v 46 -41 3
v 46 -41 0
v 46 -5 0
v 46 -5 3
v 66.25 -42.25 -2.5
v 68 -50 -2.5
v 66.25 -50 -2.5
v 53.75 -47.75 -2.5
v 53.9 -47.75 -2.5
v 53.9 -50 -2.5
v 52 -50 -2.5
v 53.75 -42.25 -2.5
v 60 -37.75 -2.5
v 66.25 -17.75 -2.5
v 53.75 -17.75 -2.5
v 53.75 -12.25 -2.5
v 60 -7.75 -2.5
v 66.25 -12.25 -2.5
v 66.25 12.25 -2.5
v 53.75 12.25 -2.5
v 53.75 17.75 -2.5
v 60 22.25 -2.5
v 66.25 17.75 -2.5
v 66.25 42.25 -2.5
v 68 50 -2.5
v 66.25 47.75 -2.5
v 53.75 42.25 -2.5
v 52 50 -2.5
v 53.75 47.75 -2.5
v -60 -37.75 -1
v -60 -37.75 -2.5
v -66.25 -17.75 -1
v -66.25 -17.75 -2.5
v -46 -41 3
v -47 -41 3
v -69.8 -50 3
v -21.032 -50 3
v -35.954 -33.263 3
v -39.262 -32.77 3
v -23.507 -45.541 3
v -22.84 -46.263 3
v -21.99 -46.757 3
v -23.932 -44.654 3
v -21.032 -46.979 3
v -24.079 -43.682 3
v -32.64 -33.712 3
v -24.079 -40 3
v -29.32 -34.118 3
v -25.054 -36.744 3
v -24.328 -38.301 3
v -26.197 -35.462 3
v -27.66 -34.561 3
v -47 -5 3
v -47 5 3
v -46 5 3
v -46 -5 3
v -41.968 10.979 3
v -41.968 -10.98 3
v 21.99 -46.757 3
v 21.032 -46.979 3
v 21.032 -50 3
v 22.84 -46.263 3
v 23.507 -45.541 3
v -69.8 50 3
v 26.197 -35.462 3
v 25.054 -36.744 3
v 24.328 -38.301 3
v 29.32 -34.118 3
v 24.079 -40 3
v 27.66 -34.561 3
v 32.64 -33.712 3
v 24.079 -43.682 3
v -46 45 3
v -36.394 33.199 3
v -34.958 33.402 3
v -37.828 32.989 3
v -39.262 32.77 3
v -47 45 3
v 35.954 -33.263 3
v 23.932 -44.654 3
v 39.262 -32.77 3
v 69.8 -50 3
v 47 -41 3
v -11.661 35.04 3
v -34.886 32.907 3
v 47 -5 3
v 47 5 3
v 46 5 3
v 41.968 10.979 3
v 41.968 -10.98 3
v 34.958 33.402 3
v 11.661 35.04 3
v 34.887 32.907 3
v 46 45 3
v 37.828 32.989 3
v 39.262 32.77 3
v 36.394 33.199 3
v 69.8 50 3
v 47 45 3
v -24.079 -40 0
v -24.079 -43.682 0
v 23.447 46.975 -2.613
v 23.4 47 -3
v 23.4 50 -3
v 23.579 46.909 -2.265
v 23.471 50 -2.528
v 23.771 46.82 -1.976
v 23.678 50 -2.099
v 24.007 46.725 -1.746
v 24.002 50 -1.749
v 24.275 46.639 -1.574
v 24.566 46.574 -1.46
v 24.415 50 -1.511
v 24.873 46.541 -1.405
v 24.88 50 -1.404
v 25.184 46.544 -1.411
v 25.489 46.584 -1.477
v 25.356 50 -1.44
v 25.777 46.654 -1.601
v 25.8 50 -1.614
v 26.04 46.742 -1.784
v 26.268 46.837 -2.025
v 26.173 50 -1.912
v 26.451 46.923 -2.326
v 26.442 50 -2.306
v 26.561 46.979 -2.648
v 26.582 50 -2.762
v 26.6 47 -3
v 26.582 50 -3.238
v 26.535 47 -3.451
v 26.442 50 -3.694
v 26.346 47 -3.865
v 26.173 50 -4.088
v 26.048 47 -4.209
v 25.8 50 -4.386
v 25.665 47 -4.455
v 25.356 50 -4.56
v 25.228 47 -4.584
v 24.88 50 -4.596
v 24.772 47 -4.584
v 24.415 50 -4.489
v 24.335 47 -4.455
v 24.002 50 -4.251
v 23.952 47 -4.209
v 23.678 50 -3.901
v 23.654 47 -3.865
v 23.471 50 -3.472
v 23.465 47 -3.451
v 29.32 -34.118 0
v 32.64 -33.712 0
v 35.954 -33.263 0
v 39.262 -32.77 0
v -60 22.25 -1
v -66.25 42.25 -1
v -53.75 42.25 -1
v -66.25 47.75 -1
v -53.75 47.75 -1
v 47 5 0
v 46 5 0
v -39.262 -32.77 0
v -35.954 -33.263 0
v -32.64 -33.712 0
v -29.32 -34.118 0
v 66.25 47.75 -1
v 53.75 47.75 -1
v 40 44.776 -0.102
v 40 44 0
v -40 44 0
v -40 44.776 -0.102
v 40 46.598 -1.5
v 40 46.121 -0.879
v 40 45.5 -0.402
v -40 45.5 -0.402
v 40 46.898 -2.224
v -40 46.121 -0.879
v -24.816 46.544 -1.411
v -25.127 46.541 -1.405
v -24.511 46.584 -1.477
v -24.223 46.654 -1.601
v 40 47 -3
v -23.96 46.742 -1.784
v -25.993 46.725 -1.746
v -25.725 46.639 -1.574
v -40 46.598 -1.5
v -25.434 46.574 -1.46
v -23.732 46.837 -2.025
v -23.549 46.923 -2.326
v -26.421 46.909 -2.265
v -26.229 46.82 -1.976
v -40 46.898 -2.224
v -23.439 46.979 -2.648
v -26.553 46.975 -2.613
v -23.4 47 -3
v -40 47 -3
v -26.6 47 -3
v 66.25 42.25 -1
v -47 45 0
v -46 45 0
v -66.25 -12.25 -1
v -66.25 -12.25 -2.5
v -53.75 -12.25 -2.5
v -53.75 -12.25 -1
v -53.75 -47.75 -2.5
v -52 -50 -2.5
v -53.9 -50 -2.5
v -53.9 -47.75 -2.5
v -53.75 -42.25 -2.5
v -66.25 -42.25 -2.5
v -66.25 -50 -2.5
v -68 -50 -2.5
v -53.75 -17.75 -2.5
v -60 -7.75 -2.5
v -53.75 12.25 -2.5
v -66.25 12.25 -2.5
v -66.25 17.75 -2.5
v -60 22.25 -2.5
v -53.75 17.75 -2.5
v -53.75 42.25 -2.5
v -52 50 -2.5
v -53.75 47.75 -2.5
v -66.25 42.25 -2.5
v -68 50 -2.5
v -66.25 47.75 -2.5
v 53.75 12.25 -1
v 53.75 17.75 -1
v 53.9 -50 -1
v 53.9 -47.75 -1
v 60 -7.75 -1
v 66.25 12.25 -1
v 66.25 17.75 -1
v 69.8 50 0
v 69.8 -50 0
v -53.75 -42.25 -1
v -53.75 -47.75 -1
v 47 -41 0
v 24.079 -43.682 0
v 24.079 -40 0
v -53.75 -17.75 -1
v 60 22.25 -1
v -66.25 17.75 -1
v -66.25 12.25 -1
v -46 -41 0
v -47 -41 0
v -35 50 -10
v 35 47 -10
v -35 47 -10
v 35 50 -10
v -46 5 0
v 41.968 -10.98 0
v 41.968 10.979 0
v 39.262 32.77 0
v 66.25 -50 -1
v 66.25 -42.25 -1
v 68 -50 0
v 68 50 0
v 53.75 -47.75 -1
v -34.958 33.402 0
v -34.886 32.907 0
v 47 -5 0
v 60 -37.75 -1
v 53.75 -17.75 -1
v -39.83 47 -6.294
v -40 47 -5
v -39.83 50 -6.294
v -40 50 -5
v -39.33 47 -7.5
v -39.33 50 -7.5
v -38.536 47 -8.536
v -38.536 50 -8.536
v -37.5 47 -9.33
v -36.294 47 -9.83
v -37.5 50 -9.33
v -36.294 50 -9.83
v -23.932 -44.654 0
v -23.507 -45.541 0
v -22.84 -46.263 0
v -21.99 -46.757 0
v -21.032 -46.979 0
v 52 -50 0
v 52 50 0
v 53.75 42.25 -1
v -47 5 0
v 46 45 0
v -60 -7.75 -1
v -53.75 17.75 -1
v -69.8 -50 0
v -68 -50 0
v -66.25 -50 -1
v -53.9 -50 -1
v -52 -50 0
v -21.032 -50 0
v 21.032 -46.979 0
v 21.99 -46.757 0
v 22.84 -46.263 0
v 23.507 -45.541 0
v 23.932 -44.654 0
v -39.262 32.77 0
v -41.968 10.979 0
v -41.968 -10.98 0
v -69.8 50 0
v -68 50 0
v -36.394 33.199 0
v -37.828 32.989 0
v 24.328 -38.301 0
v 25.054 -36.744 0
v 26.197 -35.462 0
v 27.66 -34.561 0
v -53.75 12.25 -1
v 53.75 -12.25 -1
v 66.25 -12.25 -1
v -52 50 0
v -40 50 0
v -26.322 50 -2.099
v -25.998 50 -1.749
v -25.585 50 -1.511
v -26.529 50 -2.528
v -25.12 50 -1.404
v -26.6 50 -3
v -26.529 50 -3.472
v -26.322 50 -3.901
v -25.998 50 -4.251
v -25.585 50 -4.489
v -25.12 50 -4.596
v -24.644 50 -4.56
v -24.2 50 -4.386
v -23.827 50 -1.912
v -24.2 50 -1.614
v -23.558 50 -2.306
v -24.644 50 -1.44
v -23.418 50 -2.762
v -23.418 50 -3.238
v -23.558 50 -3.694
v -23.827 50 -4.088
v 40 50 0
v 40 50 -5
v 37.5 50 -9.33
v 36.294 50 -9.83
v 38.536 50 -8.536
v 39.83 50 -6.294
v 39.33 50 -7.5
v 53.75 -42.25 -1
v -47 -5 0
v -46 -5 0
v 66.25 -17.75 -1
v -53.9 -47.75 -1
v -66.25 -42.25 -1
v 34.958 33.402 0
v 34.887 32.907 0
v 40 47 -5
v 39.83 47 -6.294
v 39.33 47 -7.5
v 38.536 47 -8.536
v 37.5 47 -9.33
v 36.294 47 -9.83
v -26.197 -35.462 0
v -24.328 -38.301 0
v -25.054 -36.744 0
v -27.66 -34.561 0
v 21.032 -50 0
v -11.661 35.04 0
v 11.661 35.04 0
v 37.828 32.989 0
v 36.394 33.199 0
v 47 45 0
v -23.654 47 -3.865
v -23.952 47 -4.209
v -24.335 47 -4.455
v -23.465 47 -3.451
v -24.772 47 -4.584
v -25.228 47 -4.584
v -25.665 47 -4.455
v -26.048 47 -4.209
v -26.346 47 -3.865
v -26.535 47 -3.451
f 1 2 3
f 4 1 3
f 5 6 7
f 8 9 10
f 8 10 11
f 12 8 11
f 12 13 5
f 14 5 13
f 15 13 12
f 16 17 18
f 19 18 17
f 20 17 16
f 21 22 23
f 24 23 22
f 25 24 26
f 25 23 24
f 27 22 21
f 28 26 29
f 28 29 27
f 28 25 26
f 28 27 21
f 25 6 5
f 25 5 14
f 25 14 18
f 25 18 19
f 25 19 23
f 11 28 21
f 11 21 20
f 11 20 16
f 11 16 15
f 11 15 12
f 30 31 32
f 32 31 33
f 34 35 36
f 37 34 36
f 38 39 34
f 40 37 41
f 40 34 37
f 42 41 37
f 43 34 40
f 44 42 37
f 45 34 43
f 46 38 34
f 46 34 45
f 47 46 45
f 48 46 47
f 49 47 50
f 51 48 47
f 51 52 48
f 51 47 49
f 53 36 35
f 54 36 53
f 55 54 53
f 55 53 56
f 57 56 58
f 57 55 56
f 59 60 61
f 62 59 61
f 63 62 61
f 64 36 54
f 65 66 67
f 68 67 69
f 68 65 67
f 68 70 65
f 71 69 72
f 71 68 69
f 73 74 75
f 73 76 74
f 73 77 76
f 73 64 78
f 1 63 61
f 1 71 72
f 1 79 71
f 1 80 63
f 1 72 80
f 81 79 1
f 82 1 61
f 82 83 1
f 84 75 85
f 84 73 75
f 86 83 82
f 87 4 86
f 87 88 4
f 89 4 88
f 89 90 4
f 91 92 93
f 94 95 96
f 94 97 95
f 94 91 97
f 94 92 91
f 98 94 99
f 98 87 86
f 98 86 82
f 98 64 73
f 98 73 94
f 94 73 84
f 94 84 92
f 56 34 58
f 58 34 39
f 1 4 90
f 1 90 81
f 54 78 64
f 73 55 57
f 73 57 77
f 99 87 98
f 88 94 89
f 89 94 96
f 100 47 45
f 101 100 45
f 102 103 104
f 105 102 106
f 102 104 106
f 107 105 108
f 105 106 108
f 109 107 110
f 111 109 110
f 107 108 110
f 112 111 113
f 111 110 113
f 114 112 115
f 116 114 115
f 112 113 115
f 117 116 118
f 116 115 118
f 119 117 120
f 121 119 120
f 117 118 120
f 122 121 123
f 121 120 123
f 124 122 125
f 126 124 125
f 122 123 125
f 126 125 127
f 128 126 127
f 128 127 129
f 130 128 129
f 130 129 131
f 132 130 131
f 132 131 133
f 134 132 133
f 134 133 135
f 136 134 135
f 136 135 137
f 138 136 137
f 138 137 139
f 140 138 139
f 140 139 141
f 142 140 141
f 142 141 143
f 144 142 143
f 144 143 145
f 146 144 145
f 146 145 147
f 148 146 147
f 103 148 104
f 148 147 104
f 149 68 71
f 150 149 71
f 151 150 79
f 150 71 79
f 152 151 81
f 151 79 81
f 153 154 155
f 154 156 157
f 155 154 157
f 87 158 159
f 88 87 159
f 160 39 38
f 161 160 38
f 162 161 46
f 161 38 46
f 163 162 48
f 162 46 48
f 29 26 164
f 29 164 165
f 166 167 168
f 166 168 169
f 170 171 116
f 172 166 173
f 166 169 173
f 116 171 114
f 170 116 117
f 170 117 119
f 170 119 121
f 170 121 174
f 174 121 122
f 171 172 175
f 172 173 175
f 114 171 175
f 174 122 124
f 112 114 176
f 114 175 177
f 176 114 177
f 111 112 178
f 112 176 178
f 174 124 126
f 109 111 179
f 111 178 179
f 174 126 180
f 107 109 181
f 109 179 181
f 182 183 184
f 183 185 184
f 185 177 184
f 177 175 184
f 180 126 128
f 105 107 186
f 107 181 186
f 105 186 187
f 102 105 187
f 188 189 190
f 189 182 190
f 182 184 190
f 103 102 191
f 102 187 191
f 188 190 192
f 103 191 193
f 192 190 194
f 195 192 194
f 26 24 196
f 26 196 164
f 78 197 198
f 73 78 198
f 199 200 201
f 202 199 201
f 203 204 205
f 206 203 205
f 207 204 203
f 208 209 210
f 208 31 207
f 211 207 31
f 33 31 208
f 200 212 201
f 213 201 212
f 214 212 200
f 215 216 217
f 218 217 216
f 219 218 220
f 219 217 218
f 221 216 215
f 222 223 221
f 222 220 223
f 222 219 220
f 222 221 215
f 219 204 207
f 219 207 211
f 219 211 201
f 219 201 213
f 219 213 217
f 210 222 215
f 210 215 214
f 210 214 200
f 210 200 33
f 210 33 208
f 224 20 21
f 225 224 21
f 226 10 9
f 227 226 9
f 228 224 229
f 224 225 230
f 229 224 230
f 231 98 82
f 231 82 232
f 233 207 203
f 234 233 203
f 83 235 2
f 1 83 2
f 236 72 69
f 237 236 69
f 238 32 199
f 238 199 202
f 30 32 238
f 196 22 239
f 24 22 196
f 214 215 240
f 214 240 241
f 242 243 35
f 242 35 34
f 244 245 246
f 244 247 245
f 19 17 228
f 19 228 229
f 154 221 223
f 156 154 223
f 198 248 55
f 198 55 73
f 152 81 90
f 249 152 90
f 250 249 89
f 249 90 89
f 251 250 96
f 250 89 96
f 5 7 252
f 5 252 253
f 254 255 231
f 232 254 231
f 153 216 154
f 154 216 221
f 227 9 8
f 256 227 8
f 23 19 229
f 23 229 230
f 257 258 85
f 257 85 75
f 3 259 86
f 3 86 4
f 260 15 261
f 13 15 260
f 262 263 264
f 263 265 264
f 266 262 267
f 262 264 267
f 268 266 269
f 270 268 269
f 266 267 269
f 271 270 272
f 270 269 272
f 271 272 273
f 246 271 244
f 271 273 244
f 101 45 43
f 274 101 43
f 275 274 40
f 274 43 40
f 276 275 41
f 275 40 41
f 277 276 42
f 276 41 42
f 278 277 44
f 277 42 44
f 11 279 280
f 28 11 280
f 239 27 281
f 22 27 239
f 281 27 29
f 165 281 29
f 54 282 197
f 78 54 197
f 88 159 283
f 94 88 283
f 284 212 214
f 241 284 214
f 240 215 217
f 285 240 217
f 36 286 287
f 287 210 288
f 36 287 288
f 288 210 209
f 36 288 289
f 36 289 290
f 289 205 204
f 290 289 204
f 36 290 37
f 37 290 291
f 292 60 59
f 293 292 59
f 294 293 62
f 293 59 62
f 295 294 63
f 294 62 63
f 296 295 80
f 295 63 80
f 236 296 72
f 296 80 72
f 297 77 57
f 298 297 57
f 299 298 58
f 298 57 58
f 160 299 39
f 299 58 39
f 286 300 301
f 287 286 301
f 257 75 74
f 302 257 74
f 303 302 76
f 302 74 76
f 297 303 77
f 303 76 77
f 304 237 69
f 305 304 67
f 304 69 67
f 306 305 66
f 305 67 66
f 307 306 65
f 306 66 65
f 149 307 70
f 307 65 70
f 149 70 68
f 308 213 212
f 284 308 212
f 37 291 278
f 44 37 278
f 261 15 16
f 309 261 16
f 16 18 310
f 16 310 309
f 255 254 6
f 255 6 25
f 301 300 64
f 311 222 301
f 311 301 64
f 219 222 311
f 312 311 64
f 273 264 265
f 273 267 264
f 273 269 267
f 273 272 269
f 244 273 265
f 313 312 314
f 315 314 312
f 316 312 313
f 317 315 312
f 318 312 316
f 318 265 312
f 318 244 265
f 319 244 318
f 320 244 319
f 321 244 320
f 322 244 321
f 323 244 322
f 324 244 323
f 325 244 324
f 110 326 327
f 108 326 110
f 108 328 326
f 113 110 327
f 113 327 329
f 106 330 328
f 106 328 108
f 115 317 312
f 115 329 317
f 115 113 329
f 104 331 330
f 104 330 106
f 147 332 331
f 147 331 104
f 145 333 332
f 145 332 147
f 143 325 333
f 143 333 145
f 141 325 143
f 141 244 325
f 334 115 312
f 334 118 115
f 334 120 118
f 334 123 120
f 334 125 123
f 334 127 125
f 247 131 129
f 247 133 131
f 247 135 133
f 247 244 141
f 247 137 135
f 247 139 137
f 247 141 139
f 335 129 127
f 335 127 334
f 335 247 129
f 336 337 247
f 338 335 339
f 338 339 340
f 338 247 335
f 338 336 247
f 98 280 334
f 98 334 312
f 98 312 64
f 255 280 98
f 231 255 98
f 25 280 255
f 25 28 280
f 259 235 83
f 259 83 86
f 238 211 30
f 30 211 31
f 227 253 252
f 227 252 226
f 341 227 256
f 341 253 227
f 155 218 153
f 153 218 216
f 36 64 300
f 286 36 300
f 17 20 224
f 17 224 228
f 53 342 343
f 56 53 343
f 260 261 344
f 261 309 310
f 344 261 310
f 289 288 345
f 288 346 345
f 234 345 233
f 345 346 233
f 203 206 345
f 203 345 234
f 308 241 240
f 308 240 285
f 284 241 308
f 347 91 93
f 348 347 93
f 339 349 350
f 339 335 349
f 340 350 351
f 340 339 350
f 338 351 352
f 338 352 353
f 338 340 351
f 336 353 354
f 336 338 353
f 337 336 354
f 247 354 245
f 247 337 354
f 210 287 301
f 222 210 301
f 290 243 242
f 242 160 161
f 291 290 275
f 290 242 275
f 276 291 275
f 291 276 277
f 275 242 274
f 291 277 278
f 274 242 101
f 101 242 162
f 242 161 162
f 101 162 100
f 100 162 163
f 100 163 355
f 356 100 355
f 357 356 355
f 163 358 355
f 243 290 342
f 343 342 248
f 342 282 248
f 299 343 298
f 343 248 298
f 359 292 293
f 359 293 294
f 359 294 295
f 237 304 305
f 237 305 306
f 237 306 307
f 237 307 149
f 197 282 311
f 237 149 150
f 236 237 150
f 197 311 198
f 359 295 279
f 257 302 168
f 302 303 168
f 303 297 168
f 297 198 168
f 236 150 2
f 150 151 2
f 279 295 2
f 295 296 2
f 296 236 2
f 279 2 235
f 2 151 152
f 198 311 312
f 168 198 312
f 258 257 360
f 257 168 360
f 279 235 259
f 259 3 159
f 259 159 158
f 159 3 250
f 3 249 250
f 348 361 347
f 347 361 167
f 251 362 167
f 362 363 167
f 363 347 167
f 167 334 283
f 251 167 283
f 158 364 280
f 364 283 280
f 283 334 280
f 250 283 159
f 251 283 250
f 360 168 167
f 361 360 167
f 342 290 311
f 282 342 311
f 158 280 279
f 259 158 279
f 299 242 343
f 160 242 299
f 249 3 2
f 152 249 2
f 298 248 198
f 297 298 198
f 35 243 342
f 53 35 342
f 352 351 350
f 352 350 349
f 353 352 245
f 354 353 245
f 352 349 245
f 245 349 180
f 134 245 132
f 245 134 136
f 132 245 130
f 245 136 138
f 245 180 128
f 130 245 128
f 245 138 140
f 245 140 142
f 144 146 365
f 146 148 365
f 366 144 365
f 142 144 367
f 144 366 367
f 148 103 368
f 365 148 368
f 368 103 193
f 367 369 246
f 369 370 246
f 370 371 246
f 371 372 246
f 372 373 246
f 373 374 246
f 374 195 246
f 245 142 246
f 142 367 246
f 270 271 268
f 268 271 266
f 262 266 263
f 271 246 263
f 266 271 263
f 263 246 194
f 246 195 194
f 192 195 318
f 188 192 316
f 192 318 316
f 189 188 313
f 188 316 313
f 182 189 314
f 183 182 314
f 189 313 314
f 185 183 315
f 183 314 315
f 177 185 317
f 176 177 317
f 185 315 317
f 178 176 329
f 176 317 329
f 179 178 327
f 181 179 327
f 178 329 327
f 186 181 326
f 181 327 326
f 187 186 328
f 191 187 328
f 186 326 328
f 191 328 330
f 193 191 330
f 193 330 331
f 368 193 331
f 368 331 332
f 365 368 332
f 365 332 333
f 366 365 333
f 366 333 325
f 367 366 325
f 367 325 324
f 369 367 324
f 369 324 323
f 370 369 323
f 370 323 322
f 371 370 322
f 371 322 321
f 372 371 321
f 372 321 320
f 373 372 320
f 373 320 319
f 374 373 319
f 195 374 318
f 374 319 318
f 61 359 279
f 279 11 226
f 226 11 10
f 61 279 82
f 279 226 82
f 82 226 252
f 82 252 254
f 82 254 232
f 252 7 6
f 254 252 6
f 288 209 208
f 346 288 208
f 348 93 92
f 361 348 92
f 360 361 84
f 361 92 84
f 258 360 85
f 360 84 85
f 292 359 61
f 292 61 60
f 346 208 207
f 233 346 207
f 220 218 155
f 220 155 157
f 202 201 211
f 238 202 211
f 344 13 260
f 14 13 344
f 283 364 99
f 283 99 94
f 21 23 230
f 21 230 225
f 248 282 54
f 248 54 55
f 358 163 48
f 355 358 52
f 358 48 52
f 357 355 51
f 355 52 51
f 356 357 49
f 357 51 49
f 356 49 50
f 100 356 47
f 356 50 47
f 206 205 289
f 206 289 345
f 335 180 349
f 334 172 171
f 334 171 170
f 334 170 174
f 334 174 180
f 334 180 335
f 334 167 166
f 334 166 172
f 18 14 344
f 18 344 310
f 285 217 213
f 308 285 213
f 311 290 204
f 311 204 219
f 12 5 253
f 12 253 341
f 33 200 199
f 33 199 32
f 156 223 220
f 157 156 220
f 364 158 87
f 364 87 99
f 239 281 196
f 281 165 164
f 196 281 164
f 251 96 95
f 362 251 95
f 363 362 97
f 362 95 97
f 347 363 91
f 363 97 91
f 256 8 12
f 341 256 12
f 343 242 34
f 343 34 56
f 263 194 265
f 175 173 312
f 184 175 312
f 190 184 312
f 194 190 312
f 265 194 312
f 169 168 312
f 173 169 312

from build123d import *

# Parameters (mm, degrees)
SKETCH1_W                 = 140
SKETCH1_H                 = 100
BOSS_EXTRUDE1_DEPTH       = 3
SKETCH3_W                 = 16
SKETCH3_H                 = 100
BOSS_EXTRUDE2_DEPTH       = 2.5
SKETCH4_W                 = 12.5
SKETCH4_H                 = 5.5
CUT_EXTRUDE1_DEPTH        = 1.5
LPATTERN1_COUNT           = 4
LPATTERN1_PITCH           = 30
LPATTERN1_COPY_1_SKETCH_W = 12.5
LPATTERN1_COPY_1_SKETCH_H = 5.5
LPATTERN1_COPY_1_DEPTH    = 1.5
LPATTERN1_COPY_2_SKETCH_W = 12.5
LPATTERN1_COPY_2_SKETCH_H = 5.5
LPATTERN1_COPY_2_DEPTH    = 1.5
LPATTERN1_COPY_3_SKETCH_W = 12.5
LPATTERN1_COPY_3_SKETCH_H = 5.5
LPATTERN1_COPY_3_DEPTH    = 1.5
CUT_EXTRUDE3_DEPTH        = 123.102416029
CUT_EXTRUDE3_DEPTH_BACK   = 123.102416029
SKETCH6_W                 = 0.2
SKETCH6_H                 = 3
CUT_EXTRUDE5_DEPTH        = 1.5
LPATTERN2_COUNT           = 2
LPATTERN2_PITCH           = 30
LPATTERN2_COL_COUNT       = 2
LPATTERN2_COL_PITCH       = 30
MIRROR4_COPY_1_DEPTH      = 1.5
MIRROR4_COPY_2_DEPTH      = 1.5
SKETCH13_W                = 1
SKETCH13_H                = 40
SKETCH13_H_2              = 36
CUT_EXTRUDE7_DEPTH        = 10
SKETCH15_W                = 80
SKETCH15_H                = 3
BOSS_EXTRUDE4_DEPTH       = 10
FILLET2_R                 = 5
FILLET3_R                 = 3
SKETCH17_W                = 12.35
SKETCH17_H                = 2.25
CUT_EXTRUDE9_DEPTH        = 1.5
SKETCH18_R                = 1.6
CUT_EXTRUDE10_DEPTH       = 10
CUT_EXTRUDE11_DEPTH       = 10
SKETCH25_W                = 42.063690351
SKETCH25_H                = 4.970755329
CUT_EXTRUDE12_DEPTH       = 10


with BuildPart() as part:
    # Sketch1 → Boss-Extrude1 (new body)
    with BuildSketch(Plane.XY):
        Rectangle(SKETCH1_W, SKETCH1_H)
    extrude(amount=BOSS_EXTRUDE1_DEPTH)

    # Sketch3 → Boss-Extrude2 (add)
    with BuildSketch(Plane(origin=(0, 0, 0), x_dir=(-1, 0, 0), z_dir=(0, 0, -1))):
        with Locations((-60, 0)):
            Rectangle(SKETCH3_W, SKETCH3_H)
        with Locations((60, 0)):
            Rectangle(SKETCH3_W, SKETCH3_H)
    extrude(amount=BOSS_EXTRUDE2_DEPTH)

    # Sketch4 → Cut-Extrude1 (cut)
    with BuildSketch(Plane(origin=(0, 0, -2.5), x_dir=(-1, 0, 0), z_dir=(0, 0, -1))):
        with Locations((-60, 45)):
            Rectangle(SKETCH4_W, SKETCH4_H)
    cut_extrude1 = extrude(amount=-CUT_EXTRUDE1_DEPTH, mode=Mode.SUBTRACT)

    # Mirror1: Cut-Extrude1 across plane
    add(cut_extrude1.mirror(Plane(origin=(0, 0, 0), x_dir=(0, 0, 1), z_dir=(1, 0, 0))), mode=Mode.SUBTRACT)

    # LPattern1: Cut-Extrude1 ×4
    with Locations(*[(0, -i * LPATTERN1_PITCH, 0) for i in range(1, LPATTERN1_COUNT)]):
        add(cut_extrude1, mode=Mode.SUBTRACT)

    # LPattern1 copy 1 sketch → LPattern1 copy 1 (cut)
    with BuildSketch(Plane(origin=(0, -30, -2.5), x_dir=(1, 0, 0), z_dir=(0, 0, -1))):
        with Locations((-60, -45)):
            Rectangle(LPATTERN1_COPY_1_SKETCH_W, LPATTERN1_COPY_1_SKETCH_H)
    extrude(amount=-LPATTERN1_COPY_1_DEPTH, mode=Mode.SUBTRACT)

    # LPattern1 copy 2 sketch → LPattern1 copy 2 (cut)
    with BuildSketch(Plane(origin=(0, -60, -2.5), x_dir=(1, 0, 0), z_dir=(0, 0, -1))):
        with Locations((-60, -45)):
            Rectangle(LPATTERN1_COPY_2_SKETCH_W, LPATTERN1_COPY_2_SKETCH_H)
    extrude(amount=-LPATTERN1_COPY_2_DEPTH, mode=Mode.SUBTRACT)

    # LPattern1 copy 3 sketch → LPattern1 copy 3 (cut)
    with BuildSketch(Plane(origin=(0, -90, -2.5), x_dir=(1, 0, 0), z_dir=(0, 0, -1))):
        with Locations((-60, -45)):
            Rectangle(LPATTERN1_COPY_3_SKETCH_W, LPATTERN1_COPY_3_SKETCH_H)
    extrude(amount=-LPATTERN1_COPY_3_DEPTH, mode=Mode.SUBTRACT)

    # Sketch6 → Cut-Extrude3 (cut, two sides: drawn at the far end of the back side and taken through both)
    with BuildSketch(Plane(origin=(0, 50, 0), x_dir=(1, 0, 0), z_dir=(0, 1, 0)).offset(-CUT_EXTRUDE3_DEPTH_BACK)):
        with Locations((-69.9, -1.5)):
            Rectangle(SKETCH6_W, SKETCH6_H)
        with Locations((69.9, -1.5)):
            Rectangle(SKETCH6_W, SKETCH6_H)
    extrude(amount=CUT_EXTRUDE3_DEPTH + CUT_EXTRUDE3_DEPTH_BACK, mode=Mode.SUBTRACT)

    # Sketch11 → Cut-Extrude5 (cut)
    with BuildSketch(Plane(origin=(0, 0, -2.5), x_dir=(-1, 0, 0), z_dir=(0, 0, -1))):
        Polygon((-53.75, 12.25), (-60, -7.75), (-66.25, 12.25), align=None)
    cut_extrude5 = extrude(amount=-CUT_EXTRUDE5_DEPTH, mode=Mode.SUBTRACT)

    # LPattern2: Cut-Extrude5 ×2
    with Locations(*[(0, i * LPATTERN2_PITCH, 0) for i in range(1, LPATTERN2_COUNT)]):
        add(cut_extrude5, mode=Mode.SUBTRACT)

    # LPattern2 col: Cut-Extrude5 ×2
    with Locations(*[(0, -i * LPATTERN2_COL_PITCH, 0) for i in range(1, LPATTERN2_COL_COUNT)]):
        add(cut_extrude5, mode=Mode.SUBTRACT)

    # Mirror4: Cut-Extrude5 across plane
    add(cut_extrude5.mirror(Plane(origin=(0, 0, 0), x_dir=(0, 0, 1), z_dir=(1, 0, 0))), mode=Mode.SUBTRACT)

    # Mirror4 copy 1 sketch → Mirror4 copy 1 (cut)
    with BuildSketch(Plane(origin=(0, 30, -2.5), x_dir=(1, 0, 0), z_dir=(0, 0, -1))):
        Polygon((-53.75, -12.25), (-60, 7.75), (-66.25, -12.25), align=None)
    extrude(amount=-MIRROR4_COPY_1_DEPTH, mode=Mode.SUBTRACT)

    # Mirror4 copy 2 sketch → Mirror4 copy 2 (cut)
    with BuildSketch(Plane(origin=(0, -30, -2.5), x_dir=(1, 0, 0), z_dir=(0, 0, -1))):
        Polygon((-53.75, -12.25), (-60, 7.75), (-66.25, -12.25), align=None)
    extrude(amount=-MIRROR4_COPY_2_DEPTH, mode=Mode.SUBTRACT)

    # Sketch13 → Cut-Extrude7 (cut)
    with BuildSketch(Plane(origin=(0, 0, 0), x_dir=(-1, 0, 0), z_dir=(0, 0, -1))):
        with Locations((-46.5, 25)):
            Rectangle(SKETCH13_W, SKETCH13_H)
        with Locations((-46.5, -23)):
            Rectangle(SKETCH13_W, SKETCH13_H_2)
    cut_extrude7 = extrude(amount=-CUT_EXTRUDE7_DEPTH, mode=Mode.SUBTRACT)

    # Mirror7: Cut-Extrude7 across plane
    add(cut_extrude7.mirror(Plane(origin=(0, 0, 0), x_dir=(0, 0, 1), z_dir=(1, 0, 0))), mode=Mode.SUBTRACT)

    # Sketch15 → Boss-Extrude4 (add)
    with BuildSketch(Plane(origin=(0, 0, 0), x_dir=(-1, 0, 0), z_dir=(0, 0, -1))):
        with Locations((0, 48.5)):
            Rectangle(SKETCH15_W, SKETCH15_H)
    extrude(amount=BOSS_EXTRUDE4_DEPTH)

    # Fillet2
    fillet2_edges = [part.edges().sort_by_distance(p)[0] for p in [
        (40, 48.5, -10),
        (-40, 48.5, -10),
    ]]
    fillet(fillet2_edges, radius=FILLET2_R)

    # Fillet3
    fillet3_edges = [part.edges().sort_by_distance(p)[0] for p in [
        (0, 47, 0),
    ]]
    fillet(fillet3_edges, radius=FILLET3_R)

    # Sketch17 → Cut-Extrude9 (cut)
    with BuildSketch(Plane(origin=(0, 0, -2.5), x_dir=(-1, 0, 0), z_dir=(0, 0, -1))):
        with Locations((-60.075, -48.875)):
            Rectangle(SKETCH17_W, SKETCH17_H)
    cut_extrude9 = extrude(amount=-CUT_EXTRUDE9_DEPTH, mode=Mode.SUBTRACT)

    # Mirror8: Cut-Extrude9 across plane
    add(cut_extrude9.mirror(Plane(origin=(0, 0, 0), x_dir=(0, 0, 1), z_dir=(1, 0, 0))), mode=Mode.SUBTRACT)

    # Sketch18 → Cut-Extrude10 (cut)
    with BuildSketch(Plane(origin=(0, 50, 0), x_dir=(1, 0, 0), z_dir=(0, 1, 0))):
        with Locations(Location((-25, 3, 0), (0, 0, 180))):
            Circle(SKETCH18_R)
        with Locations(Location((25, 3, 0), (0, 0, 180))):
            Circle(SKETCH18_R)
    extrude(amount=-CUT_EXTRUDE10_DEPTH, mode=Mode.SUBTRACT)

    # Sketch24 → Cut-Extrude11 (cut)
    with BuildSketch(Plane.XY.offset(3)):
        with BuildLine():
            Line((-24.07859083, -40.000422033), (-24.07859083, -43.681991466))
            ThreePointArc((-24.07859083, -43.681991466), (-23.20025424, -45.92649129), (-21.031820585, -46.978703301))
            ThreePointArc((-21.031820585, -46.978703301), (-16.771632398, -47.280714447), (-12.507162767, -47.514622336))
            Line((-12.507162767, -47.514622336), (12.507211948, -47.514622336))
            ThreePointArc((12.507211948, -47.514622336), (16.771681578, -47.280714447), (21.031869766, -46.978703301))
            ThreePointArc((21.031869766, -46.978703301), (23.20030342, -45.92649129), (24.078640011, -43.681991466))
            Line((24.078640011, -43.681991466), (24.078640011, -40.000422033))
            ThreePointArc((24.078640011, -40.000422033), (25.579081322, -36.061125654), (29.320000625, -34.118214731))
            ThreePointArc((29.320000625, -34.118214731), (34.297548475, -33.493160314), (39.26185403, -32.770425237))
            ThreePointArc((39.26185403, -32.770425237), (42.306988396, -0.000422033), (39.26185403, 32.769581172))
            ThreePointArc((39.26185403, 32.769581172), (37.111227515, 33.094915187), (34.957907382, 33.401915241))
            Line((34.957907382, 33.401915241), (34.886534309, 32.907026835))
            ThreePointArc((34.886534309, 32.907026835), (2.459e-05, 35.306541773), (-34.886485128, 32.907026835))
            Line((-34.886485128, 32.907026835), (-34.957858201, 33.401915241))
            ThreePointArc((-34.957858201, 33.401915241), (-37.111178334, 33.094915187), (-39.261804849, 32.769581172))
            ThreePointArc((-39.261804849, 32.769581172), (-42.306939215, -0.000422033), (-39.261804849, -32.770425237))
            ThreePointArc((-39.261804849, -32.770425237), (-34.297499295, -33.493160314), (-29.319951444, -34.118214731))
            ThreePointArc((-29.319951444, -34.118214731), (-25.579032142, -36.061125654), (-24.07859083, -40.000422033))
        make_face()
    extrude(amount=-CUT_EXTRUDE11_DEPTH, mode=Mode.SUBTRACT)

    # Sketch25 → Cut-Extrude12 (cut)
    with BuildSketch(Plane(origin=(0, 0, 0), x_dir=(-1, 0, 0), z_dir=(0, 0, -1))):
        with Locations((-2.459e-05, -47.514622336)):
            Rectangle(SKETCH25_W, SKETCH25_H)
    extrude(amount=-CUT_EXTRUDE12_DEPTH, mode=Mode.SUBTRACT)


solid = part.part
